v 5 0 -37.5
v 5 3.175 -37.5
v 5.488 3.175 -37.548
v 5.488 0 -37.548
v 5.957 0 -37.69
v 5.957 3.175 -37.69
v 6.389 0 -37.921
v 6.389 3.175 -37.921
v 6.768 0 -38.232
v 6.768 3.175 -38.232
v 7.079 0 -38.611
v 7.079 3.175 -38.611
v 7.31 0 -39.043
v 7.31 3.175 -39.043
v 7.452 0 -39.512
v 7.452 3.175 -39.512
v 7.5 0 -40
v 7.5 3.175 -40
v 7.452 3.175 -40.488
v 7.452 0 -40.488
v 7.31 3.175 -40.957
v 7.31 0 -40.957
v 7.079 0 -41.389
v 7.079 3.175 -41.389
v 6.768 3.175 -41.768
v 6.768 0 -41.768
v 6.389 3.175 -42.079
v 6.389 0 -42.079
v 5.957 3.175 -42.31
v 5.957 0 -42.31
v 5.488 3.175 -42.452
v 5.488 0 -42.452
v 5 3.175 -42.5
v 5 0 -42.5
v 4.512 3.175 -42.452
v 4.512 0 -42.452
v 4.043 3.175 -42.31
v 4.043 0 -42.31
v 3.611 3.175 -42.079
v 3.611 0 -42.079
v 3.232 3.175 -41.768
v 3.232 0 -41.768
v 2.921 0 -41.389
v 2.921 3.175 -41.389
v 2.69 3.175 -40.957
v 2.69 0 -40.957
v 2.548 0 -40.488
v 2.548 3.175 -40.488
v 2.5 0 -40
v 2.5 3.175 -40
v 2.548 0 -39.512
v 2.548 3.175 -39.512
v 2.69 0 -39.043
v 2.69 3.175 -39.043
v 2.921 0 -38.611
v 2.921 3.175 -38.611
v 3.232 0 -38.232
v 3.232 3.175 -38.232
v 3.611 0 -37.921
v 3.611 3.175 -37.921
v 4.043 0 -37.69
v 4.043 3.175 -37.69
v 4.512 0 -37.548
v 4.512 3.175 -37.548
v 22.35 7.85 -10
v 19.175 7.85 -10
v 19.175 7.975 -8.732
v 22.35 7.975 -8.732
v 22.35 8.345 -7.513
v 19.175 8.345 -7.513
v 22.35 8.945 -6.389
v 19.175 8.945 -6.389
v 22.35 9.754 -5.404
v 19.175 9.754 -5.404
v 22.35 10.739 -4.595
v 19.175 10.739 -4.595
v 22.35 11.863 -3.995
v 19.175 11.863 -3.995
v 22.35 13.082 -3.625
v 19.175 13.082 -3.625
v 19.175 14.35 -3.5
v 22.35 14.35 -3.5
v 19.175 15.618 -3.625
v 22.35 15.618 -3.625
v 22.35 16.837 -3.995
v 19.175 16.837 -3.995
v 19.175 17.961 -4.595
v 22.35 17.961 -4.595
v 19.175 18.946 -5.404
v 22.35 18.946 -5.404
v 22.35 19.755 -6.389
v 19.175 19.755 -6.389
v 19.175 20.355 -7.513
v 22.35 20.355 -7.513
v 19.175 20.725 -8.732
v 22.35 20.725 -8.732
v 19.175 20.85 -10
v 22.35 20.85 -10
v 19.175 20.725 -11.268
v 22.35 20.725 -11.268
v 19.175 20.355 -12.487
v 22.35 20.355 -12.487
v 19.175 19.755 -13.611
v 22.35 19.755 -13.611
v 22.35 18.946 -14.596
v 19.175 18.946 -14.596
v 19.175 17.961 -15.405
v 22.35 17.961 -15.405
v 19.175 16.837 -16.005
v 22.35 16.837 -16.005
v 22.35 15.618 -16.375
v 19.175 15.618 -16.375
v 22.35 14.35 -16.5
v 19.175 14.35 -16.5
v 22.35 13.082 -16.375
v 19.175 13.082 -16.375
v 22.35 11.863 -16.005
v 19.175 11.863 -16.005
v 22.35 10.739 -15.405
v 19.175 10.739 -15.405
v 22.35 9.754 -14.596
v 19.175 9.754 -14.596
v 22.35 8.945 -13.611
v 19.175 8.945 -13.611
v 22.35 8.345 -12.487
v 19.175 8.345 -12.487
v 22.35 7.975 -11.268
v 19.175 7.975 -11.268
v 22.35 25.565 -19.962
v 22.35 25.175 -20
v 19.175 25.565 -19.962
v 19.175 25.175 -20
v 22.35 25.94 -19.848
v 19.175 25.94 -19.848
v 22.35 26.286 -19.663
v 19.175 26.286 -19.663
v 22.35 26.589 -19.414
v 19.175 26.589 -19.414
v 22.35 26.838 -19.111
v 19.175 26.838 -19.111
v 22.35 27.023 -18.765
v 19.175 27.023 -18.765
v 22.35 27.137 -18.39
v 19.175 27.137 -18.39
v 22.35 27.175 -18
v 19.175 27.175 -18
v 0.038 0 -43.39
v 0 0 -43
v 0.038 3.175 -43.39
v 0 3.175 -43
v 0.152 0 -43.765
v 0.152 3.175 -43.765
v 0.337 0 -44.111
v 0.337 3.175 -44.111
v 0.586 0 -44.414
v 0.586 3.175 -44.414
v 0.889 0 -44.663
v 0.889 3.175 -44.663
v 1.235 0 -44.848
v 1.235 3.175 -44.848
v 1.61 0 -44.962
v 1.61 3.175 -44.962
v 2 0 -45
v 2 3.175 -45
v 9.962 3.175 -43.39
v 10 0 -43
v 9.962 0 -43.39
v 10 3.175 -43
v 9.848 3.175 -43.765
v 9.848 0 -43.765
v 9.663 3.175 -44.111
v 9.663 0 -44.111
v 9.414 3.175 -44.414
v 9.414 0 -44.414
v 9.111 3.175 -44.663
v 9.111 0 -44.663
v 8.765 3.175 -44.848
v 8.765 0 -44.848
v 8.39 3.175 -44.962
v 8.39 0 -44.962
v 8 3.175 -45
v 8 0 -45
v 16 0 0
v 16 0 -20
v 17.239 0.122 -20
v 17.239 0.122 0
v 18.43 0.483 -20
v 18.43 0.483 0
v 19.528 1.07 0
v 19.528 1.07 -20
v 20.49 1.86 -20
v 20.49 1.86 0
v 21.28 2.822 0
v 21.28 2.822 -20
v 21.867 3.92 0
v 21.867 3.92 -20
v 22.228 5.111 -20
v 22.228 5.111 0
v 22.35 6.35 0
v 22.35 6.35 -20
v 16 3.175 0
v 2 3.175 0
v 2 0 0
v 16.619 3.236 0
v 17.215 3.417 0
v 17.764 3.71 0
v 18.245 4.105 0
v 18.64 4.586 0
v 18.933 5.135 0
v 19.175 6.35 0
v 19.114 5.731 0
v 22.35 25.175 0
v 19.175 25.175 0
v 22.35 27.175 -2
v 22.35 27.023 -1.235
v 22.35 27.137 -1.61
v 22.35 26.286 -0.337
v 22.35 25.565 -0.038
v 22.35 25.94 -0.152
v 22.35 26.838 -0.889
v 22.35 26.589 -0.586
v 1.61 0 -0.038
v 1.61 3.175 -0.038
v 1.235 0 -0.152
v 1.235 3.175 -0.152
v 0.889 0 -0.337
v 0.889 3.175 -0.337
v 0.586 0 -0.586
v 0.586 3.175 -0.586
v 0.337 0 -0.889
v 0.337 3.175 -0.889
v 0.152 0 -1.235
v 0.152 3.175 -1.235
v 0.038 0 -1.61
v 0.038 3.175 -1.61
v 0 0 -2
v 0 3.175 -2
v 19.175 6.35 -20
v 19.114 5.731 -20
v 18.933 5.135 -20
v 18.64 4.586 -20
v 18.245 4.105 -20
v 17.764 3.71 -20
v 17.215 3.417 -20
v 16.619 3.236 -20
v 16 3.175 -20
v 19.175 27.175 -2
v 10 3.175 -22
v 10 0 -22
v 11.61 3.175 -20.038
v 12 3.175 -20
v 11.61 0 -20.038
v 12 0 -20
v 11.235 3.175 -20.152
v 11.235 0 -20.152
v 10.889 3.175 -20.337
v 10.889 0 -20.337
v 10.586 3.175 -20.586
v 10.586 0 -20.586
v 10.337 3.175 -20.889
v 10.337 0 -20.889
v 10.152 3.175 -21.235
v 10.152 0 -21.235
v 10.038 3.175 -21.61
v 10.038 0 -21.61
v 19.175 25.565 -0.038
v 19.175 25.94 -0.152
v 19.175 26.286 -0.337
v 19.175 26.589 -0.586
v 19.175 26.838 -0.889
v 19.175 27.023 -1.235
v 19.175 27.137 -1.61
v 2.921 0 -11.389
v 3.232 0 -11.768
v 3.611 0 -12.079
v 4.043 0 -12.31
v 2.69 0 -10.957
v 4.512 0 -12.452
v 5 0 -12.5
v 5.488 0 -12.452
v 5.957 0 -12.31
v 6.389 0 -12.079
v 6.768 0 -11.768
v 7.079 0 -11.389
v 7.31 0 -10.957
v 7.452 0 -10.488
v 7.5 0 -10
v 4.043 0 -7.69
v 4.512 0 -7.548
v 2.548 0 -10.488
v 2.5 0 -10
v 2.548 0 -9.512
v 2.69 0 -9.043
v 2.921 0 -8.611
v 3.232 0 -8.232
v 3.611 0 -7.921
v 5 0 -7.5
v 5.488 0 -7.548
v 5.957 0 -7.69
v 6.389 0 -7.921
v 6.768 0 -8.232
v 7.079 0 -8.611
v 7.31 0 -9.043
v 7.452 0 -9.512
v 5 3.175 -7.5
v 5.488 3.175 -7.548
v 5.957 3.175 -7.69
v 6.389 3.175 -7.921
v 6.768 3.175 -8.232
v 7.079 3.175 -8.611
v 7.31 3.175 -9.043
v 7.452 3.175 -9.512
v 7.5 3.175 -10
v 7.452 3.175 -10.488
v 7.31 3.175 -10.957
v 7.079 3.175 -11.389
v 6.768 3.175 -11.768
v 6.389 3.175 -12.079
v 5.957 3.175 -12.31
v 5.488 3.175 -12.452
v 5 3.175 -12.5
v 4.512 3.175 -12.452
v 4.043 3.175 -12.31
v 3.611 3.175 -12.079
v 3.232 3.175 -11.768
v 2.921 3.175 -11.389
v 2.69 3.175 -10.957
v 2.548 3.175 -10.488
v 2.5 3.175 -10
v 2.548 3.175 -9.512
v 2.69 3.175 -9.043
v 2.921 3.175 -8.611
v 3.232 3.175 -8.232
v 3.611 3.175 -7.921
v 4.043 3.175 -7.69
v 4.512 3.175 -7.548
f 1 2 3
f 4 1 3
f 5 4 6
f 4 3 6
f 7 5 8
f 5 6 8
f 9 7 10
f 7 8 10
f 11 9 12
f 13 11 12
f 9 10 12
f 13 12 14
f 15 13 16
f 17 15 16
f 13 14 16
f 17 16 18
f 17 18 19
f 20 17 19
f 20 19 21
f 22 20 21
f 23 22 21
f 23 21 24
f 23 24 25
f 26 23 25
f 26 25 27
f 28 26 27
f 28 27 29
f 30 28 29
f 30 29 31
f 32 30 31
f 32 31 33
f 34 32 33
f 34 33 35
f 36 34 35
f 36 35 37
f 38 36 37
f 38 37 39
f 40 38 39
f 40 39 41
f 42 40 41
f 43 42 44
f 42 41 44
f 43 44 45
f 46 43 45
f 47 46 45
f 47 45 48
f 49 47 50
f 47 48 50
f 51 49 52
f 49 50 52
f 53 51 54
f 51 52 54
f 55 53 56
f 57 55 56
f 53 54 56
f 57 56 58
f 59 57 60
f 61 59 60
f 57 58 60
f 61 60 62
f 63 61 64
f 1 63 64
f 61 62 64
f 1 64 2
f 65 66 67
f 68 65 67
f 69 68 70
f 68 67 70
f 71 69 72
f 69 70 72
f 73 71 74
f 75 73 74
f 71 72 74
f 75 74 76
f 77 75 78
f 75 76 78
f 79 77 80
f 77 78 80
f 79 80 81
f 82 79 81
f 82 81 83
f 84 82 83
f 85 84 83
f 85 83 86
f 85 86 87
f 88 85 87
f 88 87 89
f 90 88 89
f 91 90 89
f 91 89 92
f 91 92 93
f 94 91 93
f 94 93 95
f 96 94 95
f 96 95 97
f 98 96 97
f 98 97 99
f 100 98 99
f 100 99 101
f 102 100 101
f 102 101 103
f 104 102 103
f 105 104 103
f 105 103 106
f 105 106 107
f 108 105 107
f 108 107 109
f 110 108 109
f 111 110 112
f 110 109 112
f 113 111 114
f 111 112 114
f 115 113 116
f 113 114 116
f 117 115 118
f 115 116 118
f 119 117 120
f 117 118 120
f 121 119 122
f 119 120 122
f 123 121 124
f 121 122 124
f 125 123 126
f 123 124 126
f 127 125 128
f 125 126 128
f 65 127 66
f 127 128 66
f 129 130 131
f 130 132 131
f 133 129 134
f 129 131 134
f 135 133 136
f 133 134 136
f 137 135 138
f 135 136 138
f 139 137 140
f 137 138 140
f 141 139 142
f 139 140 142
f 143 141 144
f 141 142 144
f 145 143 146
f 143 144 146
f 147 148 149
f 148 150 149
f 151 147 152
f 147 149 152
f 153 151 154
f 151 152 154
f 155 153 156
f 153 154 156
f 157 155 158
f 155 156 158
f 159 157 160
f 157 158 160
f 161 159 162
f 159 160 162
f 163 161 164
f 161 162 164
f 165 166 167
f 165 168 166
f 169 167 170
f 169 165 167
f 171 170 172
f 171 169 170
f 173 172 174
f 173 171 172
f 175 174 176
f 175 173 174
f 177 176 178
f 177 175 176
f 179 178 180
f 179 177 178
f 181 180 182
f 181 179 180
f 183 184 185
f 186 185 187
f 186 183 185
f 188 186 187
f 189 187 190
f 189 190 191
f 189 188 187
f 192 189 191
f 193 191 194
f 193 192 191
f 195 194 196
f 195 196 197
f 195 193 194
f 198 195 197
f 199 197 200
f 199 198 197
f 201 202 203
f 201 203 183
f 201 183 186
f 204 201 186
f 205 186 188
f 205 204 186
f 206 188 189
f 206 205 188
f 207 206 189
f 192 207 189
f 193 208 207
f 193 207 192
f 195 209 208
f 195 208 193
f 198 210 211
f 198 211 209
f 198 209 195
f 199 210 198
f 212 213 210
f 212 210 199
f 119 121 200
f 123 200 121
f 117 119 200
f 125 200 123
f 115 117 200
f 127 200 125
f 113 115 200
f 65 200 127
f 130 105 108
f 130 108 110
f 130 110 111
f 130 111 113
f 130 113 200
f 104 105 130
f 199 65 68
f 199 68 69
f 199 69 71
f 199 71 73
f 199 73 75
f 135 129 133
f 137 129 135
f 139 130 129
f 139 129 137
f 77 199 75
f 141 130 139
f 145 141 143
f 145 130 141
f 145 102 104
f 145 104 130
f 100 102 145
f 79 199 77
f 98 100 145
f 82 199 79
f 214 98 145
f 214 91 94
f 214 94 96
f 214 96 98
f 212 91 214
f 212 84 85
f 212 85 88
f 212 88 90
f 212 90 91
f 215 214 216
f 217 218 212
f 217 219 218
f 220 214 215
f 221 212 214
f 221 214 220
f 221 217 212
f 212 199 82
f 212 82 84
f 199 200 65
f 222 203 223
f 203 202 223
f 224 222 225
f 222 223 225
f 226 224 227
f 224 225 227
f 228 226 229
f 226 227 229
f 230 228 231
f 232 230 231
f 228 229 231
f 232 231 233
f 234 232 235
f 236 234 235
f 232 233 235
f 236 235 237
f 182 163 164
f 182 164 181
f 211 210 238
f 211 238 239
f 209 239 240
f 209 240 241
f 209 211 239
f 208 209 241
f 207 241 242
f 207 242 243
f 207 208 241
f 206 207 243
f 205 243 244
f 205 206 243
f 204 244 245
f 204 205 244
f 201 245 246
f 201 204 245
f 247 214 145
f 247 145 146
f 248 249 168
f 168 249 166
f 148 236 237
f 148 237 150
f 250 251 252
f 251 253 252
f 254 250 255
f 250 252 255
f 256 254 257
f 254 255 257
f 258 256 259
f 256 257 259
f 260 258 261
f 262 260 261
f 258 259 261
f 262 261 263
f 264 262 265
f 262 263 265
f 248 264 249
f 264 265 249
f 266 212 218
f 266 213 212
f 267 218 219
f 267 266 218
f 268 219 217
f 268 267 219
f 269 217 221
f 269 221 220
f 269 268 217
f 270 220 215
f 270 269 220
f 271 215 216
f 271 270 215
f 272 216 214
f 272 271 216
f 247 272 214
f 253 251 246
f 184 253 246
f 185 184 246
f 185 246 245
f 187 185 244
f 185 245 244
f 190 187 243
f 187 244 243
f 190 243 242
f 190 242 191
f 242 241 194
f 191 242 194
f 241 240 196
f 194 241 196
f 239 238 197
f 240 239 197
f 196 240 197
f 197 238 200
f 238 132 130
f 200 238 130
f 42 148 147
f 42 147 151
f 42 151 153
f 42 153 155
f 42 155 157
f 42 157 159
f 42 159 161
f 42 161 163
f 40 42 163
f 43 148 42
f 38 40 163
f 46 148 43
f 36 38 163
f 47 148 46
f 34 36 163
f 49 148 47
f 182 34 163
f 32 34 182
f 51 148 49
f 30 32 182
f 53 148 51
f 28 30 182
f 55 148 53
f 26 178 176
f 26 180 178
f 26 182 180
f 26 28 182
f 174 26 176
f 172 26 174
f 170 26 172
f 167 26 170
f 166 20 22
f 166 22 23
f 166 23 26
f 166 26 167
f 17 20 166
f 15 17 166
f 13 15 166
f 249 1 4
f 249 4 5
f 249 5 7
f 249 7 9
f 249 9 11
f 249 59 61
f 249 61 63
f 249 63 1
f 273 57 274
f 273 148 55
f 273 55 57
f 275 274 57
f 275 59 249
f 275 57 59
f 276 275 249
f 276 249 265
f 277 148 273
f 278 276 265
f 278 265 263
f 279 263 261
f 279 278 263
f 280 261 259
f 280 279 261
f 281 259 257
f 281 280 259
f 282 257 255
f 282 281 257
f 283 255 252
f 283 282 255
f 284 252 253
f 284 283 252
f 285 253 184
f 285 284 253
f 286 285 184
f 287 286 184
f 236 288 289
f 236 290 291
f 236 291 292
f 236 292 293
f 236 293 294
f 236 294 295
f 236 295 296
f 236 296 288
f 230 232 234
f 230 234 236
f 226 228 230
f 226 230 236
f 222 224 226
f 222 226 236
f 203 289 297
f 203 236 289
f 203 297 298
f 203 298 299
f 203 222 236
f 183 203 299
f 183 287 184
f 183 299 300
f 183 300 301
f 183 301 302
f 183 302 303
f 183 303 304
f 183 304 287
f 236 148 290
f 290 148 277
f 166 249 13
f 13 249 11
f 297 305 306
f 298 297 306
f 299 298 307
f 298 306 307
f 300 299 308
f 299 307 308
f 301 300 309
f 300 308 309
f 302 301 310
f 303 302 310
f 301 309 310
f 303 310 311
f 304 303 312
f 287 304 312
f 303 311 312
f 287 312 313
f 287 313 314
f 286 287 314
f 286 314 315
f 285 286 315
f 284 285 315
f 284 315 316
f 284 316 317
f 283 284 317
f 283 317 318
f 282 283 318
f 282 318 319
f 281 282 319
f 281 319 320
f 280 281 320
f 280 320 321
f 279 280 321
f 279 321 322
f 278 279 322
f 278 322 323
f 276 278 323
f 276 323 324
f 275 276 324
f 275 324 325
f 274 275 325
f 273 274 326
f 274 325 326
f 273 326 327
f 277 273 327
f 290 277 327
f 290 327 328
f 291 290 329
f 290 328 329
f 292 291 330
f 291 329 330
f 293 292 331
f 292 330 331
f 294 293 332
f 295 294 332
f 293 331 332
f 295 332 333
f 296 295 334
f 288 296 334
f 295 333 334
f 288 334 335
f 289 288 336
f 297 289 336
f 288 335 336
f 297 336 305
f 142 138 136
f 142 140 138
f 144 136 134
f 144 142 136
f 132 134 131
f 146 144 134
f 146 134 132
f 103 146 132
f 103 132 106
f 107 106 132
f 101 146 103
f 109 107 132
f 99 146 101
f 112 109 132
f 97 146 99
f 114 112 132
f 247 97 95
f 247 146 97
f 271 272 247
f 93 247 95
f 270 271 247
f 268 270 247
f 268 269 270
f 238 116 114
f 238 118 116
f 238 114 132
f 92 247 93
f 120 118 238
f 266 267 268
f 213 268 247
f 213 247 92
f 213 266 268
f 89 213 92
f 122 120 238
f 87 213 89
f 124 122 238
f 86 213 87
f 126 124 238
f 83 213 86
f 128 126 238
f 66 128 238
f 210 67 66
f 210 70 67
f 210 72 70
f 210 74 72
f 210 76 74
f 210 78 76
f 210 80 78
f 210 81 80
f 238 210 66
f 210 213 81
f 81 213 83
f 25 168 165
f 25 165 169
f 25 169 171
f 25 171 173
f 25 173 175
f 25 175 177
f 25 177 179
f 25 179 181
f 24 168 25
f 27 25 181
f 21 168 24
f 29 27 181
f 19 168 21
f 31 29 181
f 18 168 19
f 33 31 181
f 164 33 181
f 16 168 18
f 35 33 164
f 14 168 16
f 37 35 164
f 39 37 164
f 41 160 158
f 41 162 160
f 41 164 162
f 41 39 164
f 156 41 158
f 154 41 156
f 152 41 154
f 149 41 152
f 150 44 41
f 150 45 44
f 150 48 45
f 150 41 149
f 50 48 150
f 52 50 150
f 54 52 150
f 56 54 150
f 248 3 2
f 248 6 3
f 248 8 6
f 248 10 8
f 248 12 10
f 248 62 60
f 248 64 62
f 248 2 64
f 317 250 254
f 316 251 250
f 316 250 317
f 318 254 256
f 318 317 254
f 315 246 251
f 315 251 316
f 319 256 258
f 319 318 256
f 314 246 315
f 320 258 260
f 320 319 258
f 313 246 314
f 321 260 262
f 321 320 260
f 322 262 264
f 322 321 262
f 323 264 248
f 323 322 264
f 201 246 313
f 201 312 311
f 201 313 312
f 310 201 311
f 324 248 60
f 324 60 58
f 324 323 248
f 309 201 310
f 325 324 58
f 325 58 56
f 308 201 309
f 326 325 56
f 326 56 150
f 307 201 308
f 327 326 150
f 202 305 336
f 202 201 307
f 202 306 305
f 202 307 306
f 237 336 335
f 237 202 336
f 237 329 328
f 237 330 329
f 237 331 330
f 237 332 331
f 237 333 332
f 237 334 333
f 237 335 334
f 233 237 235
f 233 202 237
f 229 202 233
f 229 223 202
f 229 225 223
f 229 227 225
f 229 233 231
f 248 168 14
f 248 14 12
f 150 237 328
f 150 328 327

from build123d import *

# Parameters (mm, degrees)
SKETCH2_W           = 10
SKETCH2_H           = 45
BOSS_EXTRUDE1_DEPTH = 3.175
CUT_EXTRUDE1_REACH  = 48.207
SKETCH4_R           = 2.5
EDGE_FLANGE2_DEPTH  = 20
CUT_EXTRUDE2_REACH  = 57.957
SKETCH15_R          = 6.5
FILLET1_R           = 2


# Sheet-metal steps are written as plain solids
with BuildPart() as part:
    # Sketch2 → Boss-Extrude1 (new body)
    with BuildSketch(Plane(origin=(0, 0, 0), x_dir=(1, 0, 0), z_dir=(0, 1, 0))):
        with Locations((5, 22.5)):
            Rectangle(SKETCH2_W, SKETCH2_H)
    extrude(amount=BOSS_EXTRUDE1_DEPTH)

    # Sketch4 → Cut-Extrude1 (cut, up to next)
    with BuildSketch(Plane(origin=(0, 3.175, 0), x_dir=(1, 0, 0), z_dir=(0, 1, 0)), mode=Mode.PRIVATE) as cut_extrude1_sk1:
        with Locations(Location((5, 10, 0), (0, 0, 270))):
            Circle(SKETCH4_R)
    cut_extrude1_tool1 = extrude(cut_extrude1_sk1.sketch, amount=-CUT_EXTRUDE1_REACH, mode=Mode.PRIVATE) & part.part
    # Sketch4 → Cut-Extrude1 (cut, up to next)
    with BuildSketch(Plane(origin=(0, 3.175, 0), x_dir=(1, 0, 0), z_dir=(0, 1, 0)), mode=Mode.PRIVATE) as cut_extrude1_sk2:
        with Locations(Location((5, 40, 0), (0, 0, 270))):
            Circle(SKETCH4_R)
    cut_extrude1_tool2 = extrude(cut_extrude1_sk2.sketch, amount=-CUT_EXTRUDE1_REACH, mode=Mode.PRIVATE) & part.part
    add(cut_extrude1_tool1.solids().sort_by_distance((5, 3.175, -10))[0], mode=Mode.SUBTRACT)
    add(cut_extrude1_tool2.solids().sort_by_distance((5, 3.175, -40))[0], mode=Mode.SUBTRACT)

    # Edge-Flange2 section (across the edge) → Edge-Flange2 (add)
    with BuildSketch(Plane(origin=(19.175, 3.175, 0), x_dir=(-1, 0, 0), z_dir=(0, 0, -1))):
        with BuildLine():
            Line((-3.175, 3.175), (-3.175, 24))
            Line((-3.175, 24), (0, 24))
            Line((0, 24), (0, 3.175))
            ThreePointArc((0, 3.175), (0.92993597, 0.92993597), (3.175, 0))
            Line((3.175, 0), (9.175, 0))
            Line((9.175, 0), (9.175, -3.175))
            Line((9.175, -3.175), (3.175, -3.175))
            ThreePointArc((3.175, -3.175), (-1.315128061, -1.315128061), (-3.175, 3.175))
        make_face()
    extrude(amount=EDGE_FLANGE2_DEPTH)

    # Sketch15 → Cut-Extrude2 (cut, up to next)
    with BuildSketch(Plane.ZY.offset(-19.175), mode=Mode.PRIVATE) as cut_extrude2_sk1:
        with Locations(Location((-10, 14.35, 0), (0, 0, 270))):
            Circle(SKETCH15_R)
    cut_extrude2_tool1 = extrude(cut_extrude2_sk1.sketch, amount=-CUT_EXTRUDE2_REACH, mode=Mode.PRIVATE) & part.part
    add(cut_extrude2_tool1.solids().sort_by_distance((19.175, 14.35, -10))[0], mode=Mode.SUBTRACT)

    # Fillet1
    fillet1_edges = [part.edges().sort_by_distance(p)[0] for p in [
        (0, 1.5875, 0),
        (0, 1.5875, -45),
        (10, 1.5875, -45),
        (10, 1.5875, -20),
        (20.7625, 27.175, 0),
        (20.7625, 27.175, -20),
    ]]
    fillet(fillet1_edges, radius=FILLET1_R)


solid = part.part
